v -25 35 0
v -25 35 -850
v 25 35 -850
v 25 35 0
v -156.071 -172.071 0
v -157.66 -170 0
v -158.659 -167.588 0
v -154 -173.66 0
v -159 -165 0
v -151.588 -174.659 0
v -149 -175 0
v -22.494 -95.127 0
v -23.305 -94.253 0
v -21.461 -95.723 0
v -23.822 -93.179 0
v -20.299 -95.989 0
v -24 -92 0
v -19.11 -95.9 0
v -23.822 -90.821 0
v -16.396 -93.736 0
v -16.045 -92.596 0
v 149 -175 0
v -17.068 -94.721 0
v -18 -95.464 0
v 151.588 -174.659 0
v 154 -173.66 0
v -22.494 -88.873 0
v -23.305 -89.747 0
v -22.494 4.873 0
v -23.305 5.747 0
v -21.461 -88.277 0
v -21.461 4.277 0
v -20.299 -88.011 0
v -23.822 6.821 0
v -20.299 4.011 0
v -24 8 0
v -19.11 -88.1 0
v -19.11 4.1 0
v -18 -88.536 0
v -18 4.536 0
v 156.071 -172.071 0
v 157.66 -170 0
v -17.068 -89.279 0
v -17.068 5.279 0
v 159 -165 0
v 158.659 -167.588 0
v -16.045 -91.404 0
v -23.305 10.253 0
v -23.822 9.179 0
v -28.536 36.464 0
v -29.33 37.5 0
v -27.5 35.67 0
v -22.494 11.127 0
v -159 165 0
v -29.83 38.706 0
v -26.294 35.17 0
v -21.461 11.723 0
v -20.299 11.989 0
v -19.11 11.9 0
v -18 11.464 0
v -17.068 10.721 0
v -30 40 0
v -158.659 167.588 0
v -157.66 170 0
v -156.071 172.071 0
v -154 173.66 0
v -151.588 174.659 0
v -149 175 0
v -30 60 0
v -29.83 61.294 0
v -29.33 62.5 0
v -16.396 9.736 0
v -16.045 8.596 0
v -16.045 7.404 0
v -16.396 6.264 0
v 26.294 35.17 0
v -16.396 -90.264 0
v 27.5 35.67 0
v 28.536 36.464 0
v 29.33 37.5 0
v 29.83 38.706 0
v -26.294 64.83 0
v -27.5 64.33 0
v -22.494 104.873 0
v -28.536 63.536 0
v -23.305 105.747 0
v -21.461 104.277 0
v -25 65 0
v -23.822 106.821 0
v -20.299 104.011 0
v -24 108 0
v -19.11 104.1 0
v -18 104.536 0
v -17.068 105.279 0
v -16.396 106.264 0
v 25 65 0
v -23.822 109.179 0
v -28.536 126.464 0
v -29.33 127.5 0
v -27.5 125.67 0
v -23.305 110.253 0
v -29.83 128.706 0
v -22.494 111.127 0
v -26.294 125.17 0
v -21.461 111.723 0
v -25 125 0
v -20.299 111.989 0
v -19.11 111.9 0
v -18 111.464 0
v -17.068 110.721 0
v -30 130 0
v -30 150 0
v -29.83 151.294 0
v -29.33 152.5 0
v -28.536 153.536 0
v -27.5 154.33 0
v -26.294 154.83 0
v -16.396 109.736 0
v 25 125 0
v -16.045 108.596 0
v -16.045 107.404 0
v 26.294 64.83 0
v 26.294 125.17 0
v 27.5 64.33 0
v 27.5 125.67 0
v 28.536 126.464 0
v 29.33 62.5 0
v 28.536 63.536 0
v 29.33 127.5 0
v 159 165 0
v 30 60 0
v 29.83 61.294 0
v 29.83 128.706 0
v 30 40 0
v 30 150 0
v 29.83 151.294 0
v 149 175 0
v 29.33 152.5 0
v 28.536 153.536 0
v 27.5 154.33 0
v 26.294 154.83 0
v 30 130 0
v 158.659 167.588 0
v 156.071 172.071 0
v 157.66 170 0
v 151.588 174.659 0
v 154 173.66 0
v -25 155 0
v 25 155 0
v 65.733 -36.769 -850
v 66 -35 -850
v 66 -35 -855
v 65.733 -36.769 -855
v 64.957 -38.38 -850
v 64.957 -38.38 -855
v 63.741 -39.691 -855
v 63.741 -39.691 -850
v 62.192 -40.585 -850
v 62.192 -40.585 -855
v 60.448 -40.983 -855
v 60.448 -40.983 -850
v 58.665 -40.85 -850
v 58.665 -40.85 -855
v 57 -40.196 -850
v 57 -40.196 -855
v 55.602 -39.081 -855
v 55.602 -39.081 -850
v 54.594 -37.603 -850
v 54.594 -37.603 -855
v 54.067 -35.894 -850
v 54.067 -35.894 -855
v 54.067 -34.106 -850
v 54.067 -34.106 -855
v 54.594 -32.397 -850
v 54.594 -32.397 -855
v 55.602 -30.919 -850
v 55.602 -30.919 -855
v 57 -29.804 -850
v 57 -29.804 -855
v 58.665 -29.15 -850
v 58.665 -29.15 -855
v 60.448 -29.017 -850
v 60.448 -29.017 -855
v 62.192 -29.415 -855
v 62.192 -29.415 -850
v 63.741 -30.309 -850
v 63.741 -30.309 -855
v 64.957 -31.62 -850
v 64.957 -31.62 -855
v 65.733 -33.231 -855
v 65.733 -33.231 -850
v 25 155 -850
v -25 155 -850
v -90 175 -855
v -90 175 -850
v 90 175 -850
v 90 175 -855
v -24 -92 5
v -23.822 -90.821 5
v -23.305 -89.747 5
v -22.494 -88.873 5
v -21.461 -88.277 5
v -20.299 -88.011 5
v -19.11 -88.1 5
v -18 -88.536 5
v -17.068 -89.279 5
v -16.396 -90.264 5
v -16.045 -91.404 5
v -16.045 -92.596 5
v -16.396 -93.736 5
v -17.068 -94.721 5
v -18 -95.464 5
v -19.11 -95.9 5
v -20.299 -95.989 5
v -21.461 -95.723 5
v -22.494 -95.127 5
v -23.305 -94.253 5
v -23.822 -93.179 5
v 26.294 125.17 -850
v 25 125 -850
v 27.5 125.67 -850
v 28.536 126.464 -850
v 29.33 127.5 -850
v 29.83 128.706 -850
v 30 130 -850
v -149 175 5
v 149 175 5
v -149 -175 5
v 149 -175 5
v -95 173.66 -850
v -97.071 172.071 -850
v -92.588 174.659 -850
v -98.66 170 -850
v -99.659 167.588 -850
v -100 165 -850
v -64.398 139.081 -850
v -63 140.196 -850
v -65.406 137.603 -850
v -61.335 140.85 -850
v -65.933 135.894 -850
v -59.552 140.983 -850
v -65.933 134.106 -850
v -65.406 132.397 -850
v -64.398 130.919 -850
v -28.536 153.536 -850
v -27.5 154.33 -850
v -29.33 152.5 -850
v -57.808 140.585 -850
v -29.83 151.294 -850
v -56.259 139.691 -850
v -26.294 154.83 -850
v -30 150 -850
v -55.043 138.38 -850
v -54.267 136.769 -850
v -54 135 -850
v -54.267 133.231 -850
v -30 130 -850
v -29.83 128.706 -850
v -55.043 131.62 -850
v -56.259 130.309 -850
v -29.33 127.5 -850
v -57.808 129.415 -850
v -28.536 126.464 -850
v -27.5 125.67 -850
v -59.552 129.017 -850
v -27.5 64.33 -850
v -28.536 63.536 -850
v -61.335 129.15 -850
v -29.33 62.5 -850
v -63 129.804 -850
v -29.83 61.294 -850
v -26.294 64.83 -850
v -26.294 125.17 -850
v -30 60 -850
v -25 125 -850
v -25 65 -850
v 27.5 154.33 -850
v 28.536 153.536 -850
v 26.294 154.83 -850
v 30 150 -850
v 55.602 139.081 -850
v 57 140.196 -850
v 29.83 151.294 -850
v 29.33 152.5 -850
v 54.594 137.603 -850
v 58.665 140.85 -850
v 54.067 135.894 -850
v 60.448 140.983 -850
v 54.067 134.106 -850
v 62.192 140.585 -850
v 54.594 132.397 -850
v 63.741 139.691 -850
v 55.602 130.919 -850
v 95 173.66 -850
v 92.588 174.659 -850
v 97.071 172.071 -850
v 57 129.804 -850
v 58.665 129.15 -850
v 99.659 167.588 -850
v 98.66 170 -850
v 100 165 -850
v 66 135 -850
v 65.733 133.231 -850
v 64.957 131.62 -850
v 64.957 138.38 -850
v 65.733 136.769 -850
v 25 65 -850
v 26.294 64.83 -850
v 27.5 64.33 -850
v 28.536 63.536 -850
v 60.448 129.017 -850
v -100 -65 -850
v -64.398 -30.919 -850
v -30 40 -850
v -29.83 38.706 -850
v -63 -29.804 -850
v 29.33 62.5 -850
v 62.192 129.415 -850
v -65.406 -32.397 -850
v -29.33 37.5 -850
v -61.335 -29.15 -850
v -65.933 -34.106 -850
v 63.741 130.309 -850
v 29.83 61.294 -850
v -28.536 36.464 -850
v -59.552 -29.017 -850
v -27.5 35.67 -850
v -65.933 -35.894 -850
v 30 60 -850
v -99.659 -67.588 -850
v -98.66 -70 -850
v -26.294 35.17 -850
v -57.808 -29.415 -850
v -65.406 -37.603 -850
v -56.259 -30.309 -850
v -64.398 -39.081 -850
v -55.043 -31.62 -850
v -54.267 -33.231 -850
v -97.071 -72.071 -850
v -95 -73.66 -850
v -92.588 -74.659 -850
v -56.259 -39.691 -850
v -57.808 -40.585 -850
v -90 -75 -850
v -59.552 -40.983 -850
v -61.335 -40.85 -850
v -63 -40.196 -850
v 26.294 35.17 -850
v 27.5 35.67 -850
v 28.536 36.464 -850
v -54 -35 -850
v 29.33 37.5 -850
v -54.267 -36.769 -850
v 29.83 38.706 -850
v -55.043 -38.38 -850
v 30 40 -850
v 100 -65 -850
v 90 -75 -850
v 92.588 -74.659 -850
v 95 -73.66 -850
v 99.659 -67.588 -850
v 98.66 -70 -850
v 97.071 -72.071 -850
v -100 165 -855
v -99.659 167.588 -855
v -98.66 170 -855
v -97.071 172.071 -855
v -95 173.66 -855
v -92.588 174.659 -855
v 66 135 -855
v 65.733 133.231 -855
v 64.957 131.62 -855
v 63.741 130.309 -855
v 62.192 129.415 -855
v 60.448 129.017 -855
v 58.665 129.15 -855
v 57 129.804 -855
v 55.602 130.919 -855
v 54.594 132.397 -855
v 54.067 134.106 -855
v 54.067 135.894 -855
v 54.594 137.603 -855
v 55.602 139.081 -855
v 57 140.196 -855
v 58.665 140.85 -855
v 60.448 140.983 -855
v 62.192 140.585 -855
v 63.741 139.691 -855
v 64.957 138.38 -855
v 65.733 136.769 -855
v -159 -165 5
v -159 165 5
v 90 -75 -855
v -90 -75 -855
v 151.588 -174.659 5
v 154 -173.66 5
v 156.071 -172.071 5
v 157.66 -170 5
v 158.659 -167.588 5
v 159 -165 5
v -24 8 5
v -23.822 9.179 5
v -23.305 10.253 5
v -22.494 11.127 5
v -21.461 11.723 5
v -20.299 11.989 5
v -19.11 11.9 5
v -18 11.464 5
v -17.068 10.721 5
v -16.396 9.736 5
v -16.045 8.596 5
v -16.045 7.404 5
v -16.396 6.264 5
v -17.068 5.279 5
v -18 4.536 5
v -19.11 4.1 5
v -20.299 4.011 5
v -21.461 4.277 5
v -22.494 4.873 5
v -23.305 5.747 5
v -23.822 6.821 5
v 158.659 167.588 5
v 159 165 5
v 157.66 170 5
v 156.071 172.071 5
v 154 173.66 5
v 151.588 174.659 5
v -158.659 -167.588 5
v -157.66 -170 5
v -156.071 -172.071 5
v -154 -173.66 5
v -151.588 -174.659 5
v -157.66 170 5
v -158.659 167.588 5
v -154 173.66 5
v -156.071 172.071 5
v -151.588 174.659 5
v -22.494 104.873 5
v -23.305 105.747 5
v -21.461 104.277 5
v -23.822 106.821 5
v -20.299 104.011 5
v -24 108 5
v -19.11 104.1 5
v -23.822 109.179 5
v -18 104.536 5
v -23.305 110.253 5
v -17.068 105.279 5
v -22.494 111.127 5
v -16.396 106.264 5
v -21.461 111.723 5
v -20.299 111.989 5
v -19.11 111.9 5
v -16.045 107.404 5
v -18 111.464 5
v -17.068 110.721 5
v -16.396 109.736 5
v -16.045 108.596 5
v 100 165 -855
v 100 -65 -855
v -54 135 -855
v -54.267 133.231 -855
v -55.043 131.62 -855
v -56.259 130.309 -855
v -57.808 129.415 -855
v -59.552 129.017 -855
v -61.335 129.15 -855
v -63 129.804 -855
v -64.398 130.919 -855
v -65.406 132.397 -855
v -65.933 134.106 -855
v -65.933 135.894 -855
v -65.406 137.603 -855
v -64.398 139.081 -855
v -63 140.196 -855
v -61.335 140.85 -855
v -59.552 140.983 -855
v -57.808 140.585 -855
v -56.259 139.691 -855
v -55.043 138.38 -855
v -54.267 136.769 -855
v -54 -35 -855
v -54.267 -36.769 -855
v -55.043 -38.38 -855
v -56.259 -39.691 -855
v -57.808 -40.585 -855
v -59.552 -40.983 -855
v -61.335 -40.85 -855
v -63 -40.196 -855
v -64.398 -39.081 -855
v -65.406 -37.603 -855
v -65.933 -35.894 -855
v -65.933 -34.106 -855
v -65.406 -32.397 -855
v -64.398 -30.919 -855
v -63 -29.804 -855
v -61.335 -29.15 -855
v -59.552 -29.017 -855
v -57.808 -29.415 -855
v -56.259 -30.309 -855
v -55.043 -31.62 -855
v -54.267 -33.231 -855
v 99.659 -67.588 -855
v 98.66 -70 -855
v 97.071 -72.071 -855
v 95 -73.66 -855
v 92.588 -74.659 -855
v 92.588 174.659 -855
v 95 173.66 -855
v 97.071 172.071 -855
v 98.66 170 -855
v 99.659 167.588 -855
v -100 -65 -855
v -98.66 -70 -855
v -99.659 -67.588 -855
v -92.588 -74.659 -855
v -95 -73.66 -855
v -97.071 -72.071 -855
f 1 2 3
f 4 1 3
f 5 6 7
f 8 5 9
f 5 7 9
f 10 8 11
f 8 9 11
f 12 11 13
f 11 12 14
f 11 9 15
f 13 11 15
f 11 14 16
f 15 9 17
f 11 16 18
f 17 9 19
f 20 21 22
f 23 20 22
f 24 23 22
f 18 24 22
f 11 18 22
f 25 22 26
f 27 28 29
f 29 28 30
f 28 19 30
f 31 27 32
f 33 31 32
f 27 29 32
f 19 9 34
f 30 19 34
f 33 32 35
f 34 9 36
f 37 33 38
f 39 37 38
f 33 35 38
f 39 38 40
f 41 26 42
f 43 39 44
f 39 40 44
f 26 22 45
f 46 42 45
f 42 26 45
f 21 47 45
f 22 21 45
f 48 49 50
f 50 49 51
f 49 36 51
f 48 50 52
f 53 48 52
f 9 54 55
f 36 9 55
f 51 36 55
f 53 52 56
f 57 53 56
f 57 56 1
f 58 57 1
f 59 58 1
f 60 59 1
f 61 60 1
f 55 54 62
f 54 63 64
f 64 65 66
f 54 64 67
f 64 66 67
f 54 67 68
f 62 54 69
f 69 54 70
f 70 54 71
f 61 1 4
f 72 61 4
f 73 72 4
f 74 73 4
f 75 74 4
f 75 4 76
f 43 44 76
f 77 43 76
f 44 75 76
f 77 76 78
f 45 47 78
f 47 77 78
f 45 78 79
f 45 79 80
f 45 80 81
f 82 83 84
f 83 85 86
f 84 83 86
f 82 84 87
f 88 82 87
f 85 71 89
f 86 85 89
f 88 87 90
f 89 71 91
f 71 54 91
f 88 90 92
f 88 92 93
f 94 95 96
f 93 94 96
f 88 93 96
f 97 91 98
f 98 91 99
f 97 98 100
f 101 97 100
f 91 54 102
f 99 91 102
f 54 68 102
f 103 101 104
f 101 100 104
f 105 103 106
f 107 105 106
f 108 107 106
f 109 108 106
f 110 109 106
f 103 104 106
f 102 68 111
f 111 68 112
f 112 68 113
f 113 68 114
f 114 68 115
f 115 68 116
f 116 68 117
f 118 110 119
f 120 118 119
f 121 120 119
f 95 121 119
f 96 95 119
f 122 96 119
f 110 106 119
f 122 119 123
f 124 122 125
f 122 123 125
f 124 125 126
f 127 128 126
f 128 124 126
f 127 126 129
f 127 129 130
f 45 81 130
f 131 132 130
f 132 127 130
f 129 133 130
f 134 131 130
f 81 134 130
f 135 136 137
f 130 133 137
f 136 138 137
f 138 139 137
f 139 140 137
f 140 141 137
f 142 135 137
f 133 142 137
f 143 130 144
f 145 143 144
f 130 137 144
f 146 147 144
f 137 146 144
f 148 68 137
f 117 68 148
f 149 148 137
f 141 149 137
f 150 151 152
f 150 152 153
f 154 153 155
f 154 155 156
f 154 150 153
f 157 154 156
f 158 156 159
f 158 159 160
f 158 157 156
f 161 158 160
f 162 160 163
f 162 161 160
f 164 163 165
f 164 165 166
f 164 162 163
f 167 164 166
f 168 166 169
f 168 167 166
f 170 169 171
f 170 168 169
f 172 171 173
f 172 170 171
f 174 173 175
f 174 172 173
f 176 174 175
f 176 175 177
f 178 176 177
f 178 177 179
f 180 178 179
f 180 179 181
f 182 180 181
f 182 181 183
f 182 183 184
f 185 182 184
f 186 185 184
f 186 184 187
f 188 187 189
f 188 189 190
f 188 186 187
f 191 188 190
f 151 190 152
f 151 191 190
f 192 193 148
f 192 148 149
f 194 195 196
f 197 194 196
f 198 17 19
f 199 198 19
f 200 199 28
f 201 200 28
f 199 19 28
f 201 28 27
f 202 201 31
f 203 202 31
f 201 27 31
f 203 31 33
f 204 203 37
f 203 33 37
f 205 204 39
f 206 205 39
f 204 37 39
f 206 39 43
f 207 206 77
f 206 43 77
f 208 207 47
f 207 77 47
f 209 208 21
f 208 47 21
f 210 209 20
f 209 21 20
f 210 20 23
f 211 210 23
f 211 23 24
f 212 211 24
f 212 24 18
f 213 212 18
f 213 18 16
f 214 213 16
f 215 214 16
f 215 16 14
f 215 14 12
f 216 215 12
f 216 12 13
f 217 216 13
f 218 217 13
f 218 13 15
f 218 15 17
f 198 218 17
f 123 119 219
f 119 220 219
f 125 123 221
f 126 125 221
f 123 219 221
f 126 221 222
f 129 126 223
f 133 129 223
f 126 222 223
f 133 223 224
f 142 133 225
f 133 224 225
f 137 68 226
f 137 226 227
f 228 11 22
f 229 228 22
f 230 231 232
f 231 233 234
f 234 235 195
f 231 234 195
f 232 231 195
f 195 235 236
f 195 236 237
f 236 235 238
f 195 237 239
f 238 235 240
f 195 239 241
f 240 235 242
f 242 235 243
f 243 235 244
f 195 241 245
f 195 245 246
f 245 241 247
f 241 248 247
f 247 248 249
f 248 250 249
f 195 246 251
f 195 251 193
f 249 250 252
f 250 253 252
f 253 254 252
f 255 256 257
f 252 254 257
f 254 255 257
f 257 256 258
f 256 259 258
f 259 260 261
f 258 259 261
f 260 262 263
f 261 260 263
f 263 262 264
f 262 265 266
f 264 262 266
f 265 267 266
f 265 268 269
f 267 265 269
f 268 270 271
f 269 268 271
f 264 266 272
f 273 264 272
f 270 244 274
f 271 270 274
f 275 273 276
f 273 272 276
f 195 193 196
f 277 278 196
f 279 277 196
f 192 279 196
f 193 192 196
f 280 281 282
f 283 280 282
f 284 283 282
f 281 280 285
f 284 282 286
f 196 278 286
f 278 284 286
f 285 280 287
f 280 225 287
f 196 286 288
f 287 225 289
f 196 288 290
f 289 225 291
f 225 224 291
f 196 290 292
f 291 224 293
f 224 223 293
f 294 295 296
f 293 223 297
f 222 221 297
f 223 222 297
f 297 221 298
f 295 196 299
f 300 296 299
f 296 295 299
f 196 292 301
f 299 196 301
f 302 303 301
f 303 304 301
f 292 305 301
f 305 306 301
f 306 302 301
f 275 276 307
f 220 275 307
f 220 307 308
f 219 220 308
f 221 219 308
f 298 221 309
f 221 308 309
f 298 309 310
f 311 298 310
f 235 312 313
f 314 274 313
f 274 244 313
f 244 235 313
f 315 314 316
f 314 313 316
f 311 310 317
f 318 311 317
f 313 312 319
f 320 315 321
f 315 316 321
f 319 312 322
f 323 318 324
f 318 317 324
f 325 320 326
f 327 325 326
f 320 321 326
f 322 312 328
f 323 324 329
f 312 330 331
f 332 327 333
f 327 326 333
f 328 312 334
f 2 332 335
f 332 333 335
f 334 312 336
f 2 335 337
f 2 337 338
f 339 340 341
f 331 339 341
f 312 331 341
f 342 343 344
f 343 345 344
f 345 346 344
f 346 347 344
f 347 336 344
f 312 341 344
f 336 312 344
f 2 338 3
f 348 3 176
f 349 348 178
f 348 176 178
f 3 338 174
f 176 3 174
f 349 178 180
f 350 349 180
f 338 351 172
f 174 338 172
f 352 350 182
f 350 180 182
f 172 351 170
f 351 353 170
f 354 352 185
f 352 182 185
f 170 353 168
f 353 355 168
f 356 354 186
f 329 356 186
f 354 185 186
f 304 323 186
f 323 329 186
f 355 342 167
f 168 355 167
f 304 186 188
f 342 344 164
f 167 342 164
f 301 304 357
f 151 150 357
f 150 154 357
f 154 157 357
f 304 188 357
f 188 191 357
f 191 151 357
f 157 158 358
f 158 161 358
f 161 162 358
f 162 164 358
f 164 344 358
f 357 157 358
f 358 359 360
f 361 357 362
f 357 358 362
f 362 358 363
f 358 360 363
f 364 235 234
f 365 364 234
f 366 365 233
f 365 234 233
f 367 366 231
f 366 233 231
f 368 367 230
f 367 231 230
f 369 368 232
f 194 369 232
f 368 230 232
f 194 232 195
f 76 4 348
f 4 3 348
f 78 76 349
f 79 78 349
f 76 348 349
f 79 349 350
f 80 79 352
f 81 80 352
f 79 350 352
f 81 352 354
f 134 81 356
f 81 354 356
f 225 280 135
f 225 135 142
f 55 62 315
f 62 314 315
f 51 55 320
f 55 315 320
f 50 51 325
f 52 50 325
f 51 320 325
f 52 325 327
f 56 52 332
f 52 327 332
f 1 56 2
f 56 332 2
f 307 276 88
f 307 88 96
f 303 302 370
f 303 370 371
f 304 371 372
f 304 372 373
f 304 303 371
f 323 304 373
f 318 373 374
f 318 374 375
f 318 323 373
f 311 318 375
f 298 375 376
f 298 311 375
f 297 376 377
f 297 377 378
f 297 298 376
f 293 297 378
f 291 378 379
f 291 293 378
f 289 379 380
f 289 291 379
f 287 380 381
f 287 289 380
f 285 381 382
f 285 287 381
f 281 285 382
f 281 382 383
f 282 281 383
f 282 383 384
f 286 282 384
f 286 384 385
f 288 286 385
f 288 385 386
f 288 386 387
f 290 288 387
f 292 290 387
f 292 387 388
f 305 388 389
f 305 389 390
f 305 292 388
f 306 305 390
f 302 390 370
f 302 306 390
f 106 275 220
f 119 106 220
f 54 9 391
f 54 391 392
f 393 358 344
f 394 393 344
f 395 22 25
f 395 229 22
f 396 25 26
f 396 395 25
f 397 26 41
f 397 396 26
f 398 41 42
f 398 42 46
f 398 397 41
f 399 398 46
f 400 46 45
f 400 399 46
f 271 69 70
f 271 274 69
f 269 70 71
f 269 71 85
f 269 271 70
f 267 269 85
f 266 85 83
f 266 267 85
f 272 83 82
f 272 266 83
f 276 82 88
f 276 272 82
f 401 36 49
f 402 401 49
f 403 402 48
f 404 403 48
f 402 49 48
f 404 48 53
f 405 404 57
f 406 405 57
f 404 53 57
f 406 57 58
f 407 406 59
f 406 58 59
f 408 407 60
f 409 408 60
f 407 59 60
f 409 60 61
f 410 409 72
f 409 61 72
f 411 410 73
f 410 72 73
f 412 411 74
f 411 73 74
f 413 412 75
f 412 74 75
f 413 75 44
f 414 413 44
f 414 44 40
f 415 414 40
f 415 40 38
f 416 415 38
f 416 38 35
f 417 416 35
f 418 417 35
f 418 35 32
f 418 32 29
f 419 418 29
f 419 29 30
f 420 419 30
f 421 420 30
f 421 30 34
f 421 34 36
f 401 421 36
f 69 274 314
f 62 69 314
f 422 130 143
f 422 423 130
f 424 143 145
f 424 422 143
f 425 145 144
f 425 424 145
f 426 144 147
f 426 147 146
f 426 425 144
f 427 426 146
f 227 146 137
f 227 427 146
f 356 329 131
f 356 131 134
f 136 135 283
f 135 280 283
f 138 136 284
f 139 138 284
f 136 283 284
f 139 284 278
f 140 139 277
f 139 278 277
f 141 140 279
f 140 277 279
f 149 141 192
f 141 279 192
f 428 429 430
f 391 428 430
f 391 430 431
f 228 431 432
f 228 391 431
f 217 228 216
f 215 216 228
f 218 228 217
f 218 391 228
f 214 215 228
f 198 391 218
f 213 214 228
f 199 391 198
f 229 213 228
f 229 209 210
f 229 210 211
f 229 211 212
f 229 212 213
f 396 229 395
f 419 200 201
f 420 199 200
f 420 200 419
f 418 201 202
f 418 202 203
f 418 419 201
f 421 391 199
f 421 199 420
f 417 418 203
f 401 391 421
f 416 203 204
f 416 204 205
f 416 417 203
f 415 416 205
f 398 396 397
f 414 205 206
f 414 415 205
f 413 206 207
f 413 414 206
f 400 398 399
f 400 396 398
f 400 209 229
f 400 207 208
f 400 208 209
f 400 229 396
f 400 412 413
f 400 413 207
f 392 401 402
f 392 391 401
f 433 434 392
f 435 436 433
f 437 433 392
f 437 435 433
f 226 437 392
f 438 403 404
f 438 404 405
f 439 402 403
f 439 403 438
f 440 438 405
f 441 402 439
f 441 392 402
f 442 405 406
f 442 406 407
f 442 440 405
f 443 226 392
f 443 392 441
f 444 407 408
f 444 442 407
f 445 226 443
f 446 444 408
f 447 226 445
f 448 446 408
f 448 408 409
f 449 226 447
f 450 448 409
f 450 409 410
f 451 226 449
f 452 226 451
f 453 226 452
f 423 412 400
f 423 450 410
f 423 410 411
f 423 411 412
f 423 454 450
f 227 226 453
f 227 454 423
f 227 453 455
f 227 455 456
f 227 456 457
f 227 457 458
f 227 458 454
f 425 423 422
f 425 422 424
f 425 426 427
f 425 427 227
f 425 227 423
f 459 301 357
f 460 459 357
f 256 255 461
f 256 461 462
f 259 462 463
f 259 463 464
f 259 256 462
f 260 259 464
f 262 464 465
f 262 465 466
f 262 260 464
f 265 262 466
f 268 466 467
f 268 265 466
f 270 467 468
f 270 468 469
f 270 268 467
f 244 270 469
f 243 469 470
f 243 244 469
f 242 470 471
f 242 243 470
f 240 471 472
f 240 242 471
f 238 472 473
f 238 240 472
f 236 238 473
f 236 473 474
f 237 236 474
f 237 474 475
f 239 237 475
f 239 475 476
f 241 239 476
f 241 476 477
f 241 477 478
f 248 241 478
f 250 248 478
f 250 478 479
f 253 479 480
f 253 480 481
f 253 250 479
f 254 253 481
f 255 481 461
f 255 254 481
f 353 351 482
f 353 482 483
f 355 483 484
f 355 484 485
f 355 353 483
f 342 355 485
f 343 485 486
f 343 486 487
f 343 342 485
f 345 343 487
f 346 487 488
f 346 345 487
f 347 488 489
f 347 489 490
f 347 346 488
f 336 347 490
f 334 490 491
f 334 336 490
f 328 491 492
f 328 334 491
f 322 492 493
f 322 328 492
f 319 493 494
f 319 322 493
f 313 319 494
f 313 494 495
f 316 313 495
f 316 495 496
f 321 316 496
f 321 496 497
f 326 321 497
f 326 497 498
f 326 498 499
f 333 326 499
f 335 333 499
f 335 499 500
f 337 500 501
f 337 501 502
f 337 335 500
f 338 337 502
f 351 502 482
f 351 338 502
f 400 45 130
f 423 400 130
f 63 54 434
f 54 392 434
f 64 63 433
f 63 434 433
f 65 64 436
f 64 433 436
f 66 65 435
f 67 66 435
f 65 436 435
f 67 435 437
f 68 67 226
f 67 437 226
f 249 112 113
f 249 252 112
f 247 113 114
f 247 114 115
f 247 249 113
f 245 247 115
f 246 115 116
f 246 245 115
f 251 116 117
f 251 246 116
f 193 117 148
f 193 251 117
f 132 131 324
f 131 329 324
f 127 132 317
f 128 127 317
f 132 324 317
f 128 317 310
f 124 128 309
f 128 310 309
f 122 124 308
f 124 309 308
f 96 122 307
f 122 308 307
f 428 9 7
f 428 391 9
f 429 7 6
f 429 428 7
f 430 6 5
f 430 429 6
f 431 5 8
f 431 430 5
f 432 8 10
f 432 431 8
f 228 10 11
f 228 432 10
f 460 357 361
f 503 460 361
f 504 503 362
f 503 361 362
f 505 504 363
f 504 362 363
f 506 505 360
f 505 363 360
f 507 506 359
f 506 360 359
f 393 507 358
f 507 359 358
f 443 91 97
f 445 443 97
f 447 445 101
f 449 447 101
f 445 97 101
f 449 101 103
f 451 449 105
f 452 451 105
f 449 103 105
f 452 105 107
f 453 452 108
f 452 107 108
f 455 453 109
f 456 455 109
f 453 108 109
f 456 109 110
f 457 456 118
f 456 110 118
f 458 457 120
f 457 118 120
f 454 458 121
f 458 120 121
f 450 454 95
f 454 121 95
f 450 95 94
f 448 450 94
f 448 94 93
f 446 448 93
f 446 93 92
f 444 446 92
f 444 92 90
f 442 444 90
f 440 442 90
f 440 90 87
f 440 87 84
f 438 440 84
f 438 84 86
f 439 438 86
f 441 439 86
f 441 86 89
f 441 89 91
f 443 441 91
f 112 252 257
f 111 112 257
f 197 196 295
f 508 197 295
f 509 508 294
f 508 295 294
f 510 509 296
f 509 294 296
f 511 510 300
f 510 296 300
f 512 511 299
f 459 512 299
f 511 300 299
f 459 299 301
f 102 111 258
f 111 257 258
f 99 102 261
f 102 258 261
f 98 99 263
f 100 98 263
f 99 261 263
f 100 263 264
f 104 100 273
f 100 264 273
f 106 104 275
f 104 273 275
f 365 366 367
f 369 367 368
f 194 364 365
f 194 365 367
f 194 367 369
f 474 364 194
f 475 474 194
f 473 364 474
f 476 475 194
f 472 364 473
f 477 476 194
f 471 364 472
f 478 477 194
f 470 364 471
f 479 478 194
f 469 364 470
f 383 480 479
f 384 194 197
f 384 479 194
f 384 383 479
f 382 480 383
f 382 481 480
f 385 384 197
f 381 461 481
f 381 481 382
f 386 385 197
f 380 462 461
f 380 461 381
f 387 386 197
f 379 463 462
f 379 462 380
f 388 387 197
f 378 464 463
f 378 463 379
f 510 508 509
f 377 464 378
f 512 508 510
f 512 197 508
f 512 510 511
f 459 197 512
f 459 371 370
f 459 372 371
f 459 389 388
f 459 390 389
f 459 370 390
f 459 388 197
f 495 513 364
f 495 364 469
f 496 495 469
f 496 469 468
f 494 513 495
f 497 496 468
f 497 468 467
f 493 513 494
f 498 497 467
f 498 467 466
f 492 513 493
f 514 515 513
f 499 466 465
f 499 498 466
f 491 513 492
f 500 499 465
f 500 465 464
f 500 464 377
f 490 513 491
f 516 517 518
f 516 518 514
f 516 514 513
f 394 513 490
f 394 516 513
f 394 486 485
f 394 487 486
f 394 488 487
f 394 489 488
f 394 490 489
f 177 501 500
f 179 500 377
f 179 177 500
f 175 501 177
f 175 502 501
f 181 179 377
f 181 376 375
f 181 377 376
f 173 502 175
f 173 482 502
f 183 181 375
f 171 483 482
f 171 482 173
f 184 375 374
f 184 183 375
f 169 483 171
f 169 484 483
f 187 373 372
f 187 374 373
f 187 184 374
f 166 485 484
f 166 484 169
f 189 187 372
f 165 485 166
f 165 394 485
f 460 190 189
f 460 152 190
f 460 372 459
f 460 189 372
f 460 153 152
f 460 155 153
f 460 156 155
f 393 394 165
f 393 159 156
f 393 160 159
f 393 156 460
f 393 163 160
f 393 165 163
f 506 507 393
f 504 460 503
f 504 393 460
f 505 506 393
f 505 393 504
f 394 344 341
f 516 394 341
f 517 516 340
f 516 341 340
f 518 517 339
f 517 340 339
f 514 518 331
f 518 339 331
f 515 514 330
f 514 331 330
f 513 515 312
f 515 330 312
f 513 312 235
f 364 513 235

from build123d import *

# Parameters (mm, degrees)
F0_W     = 318
F0_H     = 350
F1_DEPTH = 5
F2_R     = 10
F4_D     = 8
F5_W     = 60
F5_H     = 30
F6_DEPTH = 850
F7_R     = 5
F8_R     = 6
F9_DEPTH = 5


with BuildPart() as f1:
    # F0 (on Top) → F1 (new body)
    with BuildSketch(Plane.XY):
        Rectangle(F0_W, F0_H)
    extrude(amount=F1_DEPTH)

    # F2
    f2_edges = [f1.edges().sort_by_distance(p)[0] for p in [
        (-159, -175, 2.5),
        (159, -175, 2.5),
        (159, 175, 2.5),
        (-159, 175, 2.5),
    ]]
    fillet(f2_edges, radius=F2_R)

    # F4 (through all)
    with Locations(Plane.XY.offset(5)):
        with Locations((-20, -92), (-20, 8), (-20, 108)):
            Hole(F4_D / 2)

    # F5 (on face) → F6 (join)
    with BuildSketch(Plane(origin=(0, 0, 0), x_dir=(1, 0, 0), z_dir=(0, 0, -1))):
        with Locations((0, -50)):
            Rectangle(F5_W, F5_H)
        with Locations((0, -140)):
            Rectangle(F5_W, F5_H)
    extrude(amount=F6_DEPTH)

    # F7
    f7_edges = [f1.edges().sort_by_distance(p)[0] for p in [
        (-30, 125, -425),
        (-30, 155, -425),
        (30, 125, -425),
        (-30, 65, -425),
        (-30, 35, -425),
        (30, 35, -425),
        (30, 65, -425),
        (30, 155, -425),
    ]]
    fillet(f7_edges, radius=F7_R)

    # F8 (on face) → F9 (join)
    with BuildSketch(Plane(origin=(0, 0, -850), x_dir=(1, 0, 0), z_dir=(0, 0, -1))):
        with BuildLine():
            ThreePointArc((100, 65), (97.071068, 72.071068), (90, 75))
            Line((90, 75), (-90, 75))
            ThreePointArc((-90, 75), (-97.071068, 72.071068), (-100, 65))
            Line((-100, 65), (-100, -165))
            ThreePointArc((-100, -165), (-97.071068, -172.071068), (-90, -175))
            Line((-90, -175), (90, -175))
            ThreePointArc((90, -175), (97.071068, -172.071068), (100, -165))
            Line((100, -165), (100, 65))
        make_face()
        with Locations((-60, -135)):
            Circle(F8_R, mode=Mode.SUBTRACT)
        with Locations((60, -135)):
            Circle(F8_R, mode=Mode.SUBTRACT)
        with Locations((-60, 35)):
            Circle(F8_R, mode=Mode.SUBTRACT)
        with BuildLine():
            Line((30, -40), (30, -60))
            ThreePointArc((30, -60), (28.535534, -63.535534), (25, -65))
            Line((25, -65), (-25, -65))
            ThreePointArc((-25, -65), (-28.535534, -63.535534), (-30, -60))
            Line((-30, -60), (-30, -40))
            ThreePointArc((-30, -40), (-28.535534, -36.464466), (-25, -35))
            Line((-25, -35), (25, -35))
            ThreePointArc((25, -35), (28.535534, -36.464466), (30, -40))
        make_face(mode=Mode.SUBTRACT)
        with Locations((60, 35)):
            Circle(F8_R, mode=Mode.SUBTRACT)
        with BuildLine():
            ThreePointArc((25, -65), (28.535534, -63.535534), (30, -60))
            Line((30, -60), (30, -40))
            ThreePointArc((30, -40), (28.535534, -36.464466), (25, -35))
            Line((25, -35), (-25, -35))
            ThreePointArc((-25, -35), (-28.535534, -36.464466), (-30, -40))
            Line((-30, -40), (-30, -60))
            ThreePointArc((-30, -60), (-28.535534, -63.535534), (-25, -65))
            Line((-25, -65), (25, -65))
        make_face()
    extrude(amount=F9_DEPTH)


solid = f1.part
